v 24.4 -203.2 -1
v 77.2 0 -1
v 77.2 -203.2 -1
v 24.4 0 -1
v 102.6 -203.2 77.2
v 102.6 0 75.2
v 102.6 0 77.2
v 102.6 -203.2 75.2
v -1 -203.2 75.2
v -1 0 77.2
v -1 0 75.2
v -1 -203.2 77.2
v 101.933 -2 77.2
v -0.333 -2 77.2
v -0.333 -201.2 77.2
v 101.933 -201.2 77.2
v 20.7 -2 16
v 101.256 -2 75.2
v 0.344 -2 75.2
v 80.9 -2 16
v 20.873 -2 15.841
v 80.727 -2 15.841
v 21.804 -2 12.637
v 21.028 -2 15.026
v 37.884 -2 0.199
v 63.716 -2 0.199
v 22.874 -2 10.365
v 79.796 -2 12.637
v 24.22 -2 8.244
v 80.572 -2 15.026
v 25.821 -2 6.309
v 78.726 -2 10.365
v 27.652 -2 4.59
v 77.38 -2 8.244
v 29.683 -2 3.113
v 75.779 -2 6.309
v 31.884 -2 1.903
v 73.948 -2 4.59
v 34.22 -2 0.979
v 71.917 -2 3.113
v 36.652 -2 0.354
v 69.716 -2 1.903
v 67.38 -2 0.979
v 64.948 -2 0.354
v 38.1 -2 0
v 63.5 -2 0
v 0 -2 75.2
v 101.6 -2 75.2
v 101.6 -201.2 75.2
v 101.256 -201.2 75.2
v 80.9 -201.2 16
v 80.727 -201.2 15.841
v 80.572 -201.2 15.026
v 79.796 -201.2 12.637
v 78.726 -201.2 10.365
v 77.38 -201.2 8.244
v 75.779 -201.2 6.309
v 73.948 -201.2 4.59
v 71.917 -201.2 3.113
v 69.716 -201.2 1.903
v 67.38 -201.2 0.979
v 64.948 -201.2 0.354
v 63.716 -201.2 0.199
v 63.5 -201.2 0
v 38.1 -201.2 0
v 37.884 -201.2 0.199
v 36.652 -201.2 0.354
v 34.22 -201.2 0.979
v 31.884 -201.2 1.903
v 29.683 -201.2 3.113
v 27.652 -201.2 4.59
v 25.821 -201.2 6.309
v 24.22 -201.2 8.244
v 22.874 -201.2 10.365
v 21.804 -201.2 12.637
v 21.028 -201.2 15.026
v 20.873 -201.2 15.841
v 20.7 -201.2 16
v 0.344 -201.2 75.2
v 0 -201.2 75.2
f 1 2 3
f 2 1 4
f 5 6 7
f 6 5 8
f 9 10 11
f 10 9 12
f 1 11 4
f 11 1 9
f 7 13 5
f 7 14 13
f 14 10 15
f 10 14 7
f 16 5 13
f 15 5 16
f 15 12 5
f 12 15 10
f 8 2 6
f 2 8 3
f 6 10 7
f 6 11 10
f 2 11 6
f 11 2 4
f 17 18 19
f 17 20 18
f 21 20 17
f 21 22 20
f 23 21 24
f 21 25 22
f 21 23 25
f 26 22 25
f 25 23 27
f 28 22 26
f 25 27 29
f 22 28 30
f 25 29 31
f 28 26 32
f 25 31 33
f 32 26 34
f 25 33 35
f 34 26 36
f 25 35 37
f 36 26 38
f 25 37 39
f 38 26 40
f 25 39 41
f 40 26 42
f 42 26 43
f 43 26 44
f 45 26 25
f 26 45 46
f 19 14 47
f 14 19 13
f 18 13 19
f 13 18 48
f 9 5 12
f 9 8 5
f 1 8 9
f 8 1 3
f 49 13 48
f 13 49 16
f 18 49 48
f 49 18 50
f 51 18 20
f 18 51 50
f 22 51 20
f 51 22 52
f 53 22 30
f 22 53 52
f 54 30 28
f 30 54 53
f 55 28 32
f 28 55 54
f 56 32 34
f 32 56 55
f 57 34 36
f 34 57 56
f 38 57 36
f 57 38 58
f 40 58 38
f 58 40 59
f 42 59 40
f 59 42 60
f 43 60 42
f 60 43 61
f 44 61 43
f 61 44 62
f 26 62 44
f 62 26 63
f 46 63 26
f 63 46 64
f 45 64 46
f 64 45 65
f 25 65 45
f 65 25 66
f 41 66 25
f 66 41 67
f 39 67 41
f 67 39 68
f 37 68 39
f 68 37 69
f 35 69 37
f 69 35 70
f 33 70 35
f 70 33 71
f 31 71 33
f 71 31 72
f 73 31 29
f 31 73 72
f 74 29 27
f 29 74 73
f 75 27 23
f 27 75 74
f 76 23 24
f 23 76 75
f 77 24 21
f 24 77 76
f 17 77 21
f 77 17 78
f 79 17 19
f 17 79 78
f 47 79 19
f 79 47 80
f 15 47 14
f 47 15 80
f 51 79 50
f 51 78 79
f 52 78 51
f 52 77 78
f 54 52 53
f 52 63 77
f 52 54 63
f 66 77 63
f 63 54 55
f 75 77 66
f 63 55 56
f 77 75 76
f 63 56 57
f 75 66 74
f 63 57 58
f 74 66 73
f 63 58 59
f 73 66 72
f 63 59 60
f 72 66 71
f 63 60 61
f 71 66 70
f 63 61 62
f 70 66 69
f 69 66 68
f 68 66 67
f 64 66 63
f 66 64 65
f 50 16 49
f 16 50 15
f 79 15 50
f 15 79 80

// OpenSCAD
tw=8*25.4;
th=4*25.4;
td=3*25.4;
echo(str("Total Size: ",tw,"x",th,"x",td));
rotate([90,0]) {
linear_extrude(2) step2(0);
linear_extrude(tw) step3();
translate([0,0,tw-2]) linear_extrude(2) step2(0);
}
module step2(round=1){
  minkowski(){
    profile(0);
    if(round)
      circle(r=2,$fn=20);
    else
      translate([-1,-1]) square([2,2]);
  }
}
module step3(){
difference(){
  step2(0);
  profile();
  polygon([[0,td-1],[-1,td+5],[th+1,td+5],[th,td-1]]);
}
}

module profile(circles=1){
polygon(circles?
  [[0,td],[th/4-4.7,16],[th*3/8,0],[th*5/8,0],[th*3/4+4.7,16],[th,td]] :
  [[0,td],[th/4,0],[th*3/4,0],[th,td]]);
  if(circles) {
translate([th/4+15,20]) circle(r=20,$fn=50);
translate([th*3/4-15,20]) circle(r=20,$fn=50);
  }
}
